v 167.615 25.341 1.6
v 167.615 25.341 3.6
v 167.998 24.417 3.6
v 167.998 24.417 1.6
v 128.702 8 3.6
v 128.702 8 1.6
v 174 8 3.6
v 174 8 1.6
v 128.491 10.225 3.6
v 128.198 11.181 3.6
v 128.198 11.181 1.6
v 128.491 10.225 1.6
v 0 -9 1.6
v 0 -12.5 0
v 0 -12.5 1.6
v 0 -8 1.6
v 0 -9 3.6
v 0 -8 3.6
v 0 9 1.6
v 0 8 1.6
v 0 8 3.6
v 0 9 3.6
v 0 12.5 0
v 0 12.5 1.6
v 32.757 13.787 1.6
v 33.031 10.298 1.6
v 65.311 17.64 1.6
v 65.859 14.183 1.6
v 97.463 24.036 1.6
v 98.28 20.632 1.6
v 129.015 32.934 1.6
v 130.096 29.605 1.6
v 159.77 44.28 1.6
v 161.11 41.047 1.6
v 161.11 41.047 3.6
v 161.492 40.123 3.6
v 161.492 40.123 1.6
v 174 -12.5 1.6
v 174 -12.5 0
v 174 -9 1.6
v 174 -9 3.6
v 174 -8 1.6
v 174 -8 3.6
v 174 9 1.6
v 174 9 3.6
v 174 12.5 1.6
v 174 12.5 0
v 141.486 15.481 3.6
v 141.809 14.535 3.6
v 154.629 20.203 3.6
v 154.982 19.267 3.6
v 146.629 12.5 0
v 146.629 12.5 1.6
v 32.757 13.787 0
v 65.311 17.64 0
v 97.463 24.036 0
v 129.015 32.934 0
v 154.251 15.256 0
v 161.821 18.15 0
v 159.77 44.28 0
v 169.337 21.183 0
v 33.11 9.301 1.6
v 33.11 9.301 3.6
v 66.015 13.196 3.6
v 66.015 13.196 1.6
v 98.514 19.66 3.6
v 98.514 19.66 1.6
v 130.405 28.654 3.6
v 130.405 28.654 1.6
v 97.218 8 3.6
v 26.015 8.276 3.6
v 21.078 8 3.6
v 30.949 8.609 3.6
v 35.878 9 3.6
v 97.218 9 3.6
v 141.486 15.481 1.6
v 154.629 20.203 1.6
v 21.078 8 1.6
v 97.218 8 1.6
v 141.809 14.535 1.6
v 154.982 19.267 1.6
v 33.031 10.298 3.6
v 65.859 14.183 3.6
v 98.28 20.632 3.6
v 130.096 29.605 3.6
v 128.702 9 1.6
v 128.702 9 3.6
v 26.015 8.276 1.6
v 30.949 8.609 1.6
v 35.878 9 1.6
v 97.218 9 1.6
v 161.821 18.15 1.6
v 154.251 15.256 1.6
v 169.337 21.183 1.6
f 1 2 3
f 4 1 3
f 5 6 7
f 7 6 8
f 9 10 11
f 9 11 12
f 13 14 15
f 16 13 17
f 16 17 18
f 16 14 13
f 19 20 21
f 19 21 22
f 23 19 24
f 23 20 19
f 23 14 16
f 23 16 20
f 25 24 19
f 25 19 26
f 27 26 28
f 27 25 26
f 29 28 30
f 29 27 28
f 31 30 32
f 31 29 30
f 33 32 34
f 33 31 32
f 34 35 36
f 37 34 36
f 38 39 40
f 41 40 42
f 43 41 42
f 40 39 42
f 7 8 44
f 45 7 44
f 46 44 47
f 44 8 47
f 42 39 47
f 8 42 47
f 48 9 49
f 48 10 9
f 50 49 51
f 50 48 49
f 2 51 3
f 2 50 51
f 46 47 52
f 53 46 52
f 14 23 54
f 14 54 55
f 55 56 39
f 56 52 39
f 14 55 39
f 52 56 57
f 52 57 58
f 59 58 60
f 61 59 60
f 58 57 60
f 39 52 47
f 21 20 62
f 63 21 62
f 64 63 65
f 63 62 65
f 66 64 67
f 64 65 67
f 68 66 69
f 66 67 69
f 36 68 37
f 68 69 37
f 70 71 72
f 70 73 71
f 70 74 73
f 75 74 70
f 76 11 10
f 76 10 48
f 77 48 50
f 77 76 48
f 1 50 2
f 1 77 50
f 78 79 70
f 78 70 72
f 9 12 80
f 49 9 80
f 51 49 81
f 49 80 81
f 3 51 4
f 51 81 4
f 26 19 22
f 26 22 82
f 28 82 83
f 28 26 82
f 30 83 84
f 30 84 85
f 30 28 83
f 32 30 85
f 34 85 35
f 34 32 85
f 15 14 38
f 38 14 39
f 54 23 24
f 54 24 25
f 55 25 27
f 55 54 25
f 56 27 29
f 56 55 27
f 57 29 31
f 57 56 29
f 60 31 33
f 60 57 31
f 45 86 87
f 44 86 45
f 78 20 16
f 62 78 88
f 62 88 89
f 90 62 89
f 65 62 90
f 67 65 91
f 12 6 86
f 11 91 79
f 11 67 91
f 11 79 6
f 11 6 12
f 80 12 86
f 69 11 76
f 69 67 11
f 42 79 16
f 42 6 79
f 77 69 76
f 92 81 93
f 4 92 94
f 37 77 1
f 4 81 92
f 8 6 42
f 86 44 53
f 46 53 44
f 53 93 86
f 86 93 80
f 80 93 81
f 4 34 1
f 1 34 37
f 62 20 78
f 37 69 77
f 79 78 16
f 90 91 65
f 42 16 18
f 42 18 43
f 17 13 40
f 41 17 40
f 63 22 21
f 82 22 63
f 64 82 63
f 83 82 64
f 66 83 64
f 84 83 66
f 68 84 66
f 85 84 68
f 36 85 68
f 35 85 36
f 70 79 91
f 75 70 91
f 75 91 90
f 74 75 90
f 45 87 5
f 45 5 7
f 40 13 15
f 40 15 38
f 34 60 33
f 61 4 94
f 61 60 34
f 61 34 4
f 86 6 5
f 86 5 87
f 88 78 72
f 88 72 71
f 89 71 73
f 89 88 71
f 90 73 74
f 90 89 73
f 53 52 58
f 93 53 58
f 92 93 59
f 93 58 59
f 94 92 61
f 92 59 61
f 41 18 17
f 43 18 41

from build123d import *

# Parameters (mm, degrees)
PAD_DEPTH     = 1.6
SKETCH001_W   = 174
SKETCH001_H   = 1
SKETCH001_W_2 = 45.298462
PAD001_DEPTH  = 2


with BuildPart() as part:
    # Sketch → Pad (new body)
    with BuildSketch(Plane.XY):
        with BuildLine():
            Line((0, -12.5), (174, -12.5))
            Line((174, -12.5), (174, 12.5))
            Line((174, 12.5), (146.628783, 12.5))
            ThreePointArc((146.628783, 12.5), (158.042748, 16.685665), (169.337419, 21.183307))
            Line((159.770333, 44.280295), (169.337419, 21.183307))
            ThreePointArc((0, 12.5), (81.450209, 20.522145), (159.770333, 44.280295))
            Line((0, -12.5), (0, 12.5))
        make_face()
    extrude(amount=PAD_DEPTH)

    # Sketch001 (on Face9 of Pad) → Pad001 (join)
    with BuildSketch(Plane.XY.offset(1.6)):
        with Locations((87, -8.5)):
            Rectangle(SKETCH001_W, SKETCH001_H)
        with BuildLine():
            ThreePointArc((0, 8), (82.328116, 16.108612), (161.492408, 40.122837))
            Line((161.109725, 41.046717), (161.492408, 40.122837))
            ThreePointArc((0, 9), (82.133026, 17.089397), (161.109725, 41.046717))
            Line((0, 9), (0, 8))
        make_face()
        with BuildLine():
            ThreePointArc((128.49115, 10.225031), (148.414319, 16.848466), (167.998027, 24.416885))
            Line((167.615343, 25.340765), (167.998027, 24.416885))
            ThreePointArc((128.198459, 11.181238), (148.076245, 17.789586), (167.615343, 25.340765))
            Line((128.198459, 11.181238), (128.49115, 10.225031))
        make_face()
        with Locations((151.350769, 8.5)):
            Rectangle(SKETCH001_W_2, SKETCH001_H)
        with BuildLine():
            Line((97.217995, 8), (97.217995, 9))
            Line((97.217995, 9), (35.878481, 9))
            ThreePointArc((21.077604, 8), (28.482431, 8.435039), (35.878481, 9))
            Line((97.217995, 8), (21.077604, 8))
        make_face()
    extrude(amount=PAD001_DEPTH)


solid = part.part
